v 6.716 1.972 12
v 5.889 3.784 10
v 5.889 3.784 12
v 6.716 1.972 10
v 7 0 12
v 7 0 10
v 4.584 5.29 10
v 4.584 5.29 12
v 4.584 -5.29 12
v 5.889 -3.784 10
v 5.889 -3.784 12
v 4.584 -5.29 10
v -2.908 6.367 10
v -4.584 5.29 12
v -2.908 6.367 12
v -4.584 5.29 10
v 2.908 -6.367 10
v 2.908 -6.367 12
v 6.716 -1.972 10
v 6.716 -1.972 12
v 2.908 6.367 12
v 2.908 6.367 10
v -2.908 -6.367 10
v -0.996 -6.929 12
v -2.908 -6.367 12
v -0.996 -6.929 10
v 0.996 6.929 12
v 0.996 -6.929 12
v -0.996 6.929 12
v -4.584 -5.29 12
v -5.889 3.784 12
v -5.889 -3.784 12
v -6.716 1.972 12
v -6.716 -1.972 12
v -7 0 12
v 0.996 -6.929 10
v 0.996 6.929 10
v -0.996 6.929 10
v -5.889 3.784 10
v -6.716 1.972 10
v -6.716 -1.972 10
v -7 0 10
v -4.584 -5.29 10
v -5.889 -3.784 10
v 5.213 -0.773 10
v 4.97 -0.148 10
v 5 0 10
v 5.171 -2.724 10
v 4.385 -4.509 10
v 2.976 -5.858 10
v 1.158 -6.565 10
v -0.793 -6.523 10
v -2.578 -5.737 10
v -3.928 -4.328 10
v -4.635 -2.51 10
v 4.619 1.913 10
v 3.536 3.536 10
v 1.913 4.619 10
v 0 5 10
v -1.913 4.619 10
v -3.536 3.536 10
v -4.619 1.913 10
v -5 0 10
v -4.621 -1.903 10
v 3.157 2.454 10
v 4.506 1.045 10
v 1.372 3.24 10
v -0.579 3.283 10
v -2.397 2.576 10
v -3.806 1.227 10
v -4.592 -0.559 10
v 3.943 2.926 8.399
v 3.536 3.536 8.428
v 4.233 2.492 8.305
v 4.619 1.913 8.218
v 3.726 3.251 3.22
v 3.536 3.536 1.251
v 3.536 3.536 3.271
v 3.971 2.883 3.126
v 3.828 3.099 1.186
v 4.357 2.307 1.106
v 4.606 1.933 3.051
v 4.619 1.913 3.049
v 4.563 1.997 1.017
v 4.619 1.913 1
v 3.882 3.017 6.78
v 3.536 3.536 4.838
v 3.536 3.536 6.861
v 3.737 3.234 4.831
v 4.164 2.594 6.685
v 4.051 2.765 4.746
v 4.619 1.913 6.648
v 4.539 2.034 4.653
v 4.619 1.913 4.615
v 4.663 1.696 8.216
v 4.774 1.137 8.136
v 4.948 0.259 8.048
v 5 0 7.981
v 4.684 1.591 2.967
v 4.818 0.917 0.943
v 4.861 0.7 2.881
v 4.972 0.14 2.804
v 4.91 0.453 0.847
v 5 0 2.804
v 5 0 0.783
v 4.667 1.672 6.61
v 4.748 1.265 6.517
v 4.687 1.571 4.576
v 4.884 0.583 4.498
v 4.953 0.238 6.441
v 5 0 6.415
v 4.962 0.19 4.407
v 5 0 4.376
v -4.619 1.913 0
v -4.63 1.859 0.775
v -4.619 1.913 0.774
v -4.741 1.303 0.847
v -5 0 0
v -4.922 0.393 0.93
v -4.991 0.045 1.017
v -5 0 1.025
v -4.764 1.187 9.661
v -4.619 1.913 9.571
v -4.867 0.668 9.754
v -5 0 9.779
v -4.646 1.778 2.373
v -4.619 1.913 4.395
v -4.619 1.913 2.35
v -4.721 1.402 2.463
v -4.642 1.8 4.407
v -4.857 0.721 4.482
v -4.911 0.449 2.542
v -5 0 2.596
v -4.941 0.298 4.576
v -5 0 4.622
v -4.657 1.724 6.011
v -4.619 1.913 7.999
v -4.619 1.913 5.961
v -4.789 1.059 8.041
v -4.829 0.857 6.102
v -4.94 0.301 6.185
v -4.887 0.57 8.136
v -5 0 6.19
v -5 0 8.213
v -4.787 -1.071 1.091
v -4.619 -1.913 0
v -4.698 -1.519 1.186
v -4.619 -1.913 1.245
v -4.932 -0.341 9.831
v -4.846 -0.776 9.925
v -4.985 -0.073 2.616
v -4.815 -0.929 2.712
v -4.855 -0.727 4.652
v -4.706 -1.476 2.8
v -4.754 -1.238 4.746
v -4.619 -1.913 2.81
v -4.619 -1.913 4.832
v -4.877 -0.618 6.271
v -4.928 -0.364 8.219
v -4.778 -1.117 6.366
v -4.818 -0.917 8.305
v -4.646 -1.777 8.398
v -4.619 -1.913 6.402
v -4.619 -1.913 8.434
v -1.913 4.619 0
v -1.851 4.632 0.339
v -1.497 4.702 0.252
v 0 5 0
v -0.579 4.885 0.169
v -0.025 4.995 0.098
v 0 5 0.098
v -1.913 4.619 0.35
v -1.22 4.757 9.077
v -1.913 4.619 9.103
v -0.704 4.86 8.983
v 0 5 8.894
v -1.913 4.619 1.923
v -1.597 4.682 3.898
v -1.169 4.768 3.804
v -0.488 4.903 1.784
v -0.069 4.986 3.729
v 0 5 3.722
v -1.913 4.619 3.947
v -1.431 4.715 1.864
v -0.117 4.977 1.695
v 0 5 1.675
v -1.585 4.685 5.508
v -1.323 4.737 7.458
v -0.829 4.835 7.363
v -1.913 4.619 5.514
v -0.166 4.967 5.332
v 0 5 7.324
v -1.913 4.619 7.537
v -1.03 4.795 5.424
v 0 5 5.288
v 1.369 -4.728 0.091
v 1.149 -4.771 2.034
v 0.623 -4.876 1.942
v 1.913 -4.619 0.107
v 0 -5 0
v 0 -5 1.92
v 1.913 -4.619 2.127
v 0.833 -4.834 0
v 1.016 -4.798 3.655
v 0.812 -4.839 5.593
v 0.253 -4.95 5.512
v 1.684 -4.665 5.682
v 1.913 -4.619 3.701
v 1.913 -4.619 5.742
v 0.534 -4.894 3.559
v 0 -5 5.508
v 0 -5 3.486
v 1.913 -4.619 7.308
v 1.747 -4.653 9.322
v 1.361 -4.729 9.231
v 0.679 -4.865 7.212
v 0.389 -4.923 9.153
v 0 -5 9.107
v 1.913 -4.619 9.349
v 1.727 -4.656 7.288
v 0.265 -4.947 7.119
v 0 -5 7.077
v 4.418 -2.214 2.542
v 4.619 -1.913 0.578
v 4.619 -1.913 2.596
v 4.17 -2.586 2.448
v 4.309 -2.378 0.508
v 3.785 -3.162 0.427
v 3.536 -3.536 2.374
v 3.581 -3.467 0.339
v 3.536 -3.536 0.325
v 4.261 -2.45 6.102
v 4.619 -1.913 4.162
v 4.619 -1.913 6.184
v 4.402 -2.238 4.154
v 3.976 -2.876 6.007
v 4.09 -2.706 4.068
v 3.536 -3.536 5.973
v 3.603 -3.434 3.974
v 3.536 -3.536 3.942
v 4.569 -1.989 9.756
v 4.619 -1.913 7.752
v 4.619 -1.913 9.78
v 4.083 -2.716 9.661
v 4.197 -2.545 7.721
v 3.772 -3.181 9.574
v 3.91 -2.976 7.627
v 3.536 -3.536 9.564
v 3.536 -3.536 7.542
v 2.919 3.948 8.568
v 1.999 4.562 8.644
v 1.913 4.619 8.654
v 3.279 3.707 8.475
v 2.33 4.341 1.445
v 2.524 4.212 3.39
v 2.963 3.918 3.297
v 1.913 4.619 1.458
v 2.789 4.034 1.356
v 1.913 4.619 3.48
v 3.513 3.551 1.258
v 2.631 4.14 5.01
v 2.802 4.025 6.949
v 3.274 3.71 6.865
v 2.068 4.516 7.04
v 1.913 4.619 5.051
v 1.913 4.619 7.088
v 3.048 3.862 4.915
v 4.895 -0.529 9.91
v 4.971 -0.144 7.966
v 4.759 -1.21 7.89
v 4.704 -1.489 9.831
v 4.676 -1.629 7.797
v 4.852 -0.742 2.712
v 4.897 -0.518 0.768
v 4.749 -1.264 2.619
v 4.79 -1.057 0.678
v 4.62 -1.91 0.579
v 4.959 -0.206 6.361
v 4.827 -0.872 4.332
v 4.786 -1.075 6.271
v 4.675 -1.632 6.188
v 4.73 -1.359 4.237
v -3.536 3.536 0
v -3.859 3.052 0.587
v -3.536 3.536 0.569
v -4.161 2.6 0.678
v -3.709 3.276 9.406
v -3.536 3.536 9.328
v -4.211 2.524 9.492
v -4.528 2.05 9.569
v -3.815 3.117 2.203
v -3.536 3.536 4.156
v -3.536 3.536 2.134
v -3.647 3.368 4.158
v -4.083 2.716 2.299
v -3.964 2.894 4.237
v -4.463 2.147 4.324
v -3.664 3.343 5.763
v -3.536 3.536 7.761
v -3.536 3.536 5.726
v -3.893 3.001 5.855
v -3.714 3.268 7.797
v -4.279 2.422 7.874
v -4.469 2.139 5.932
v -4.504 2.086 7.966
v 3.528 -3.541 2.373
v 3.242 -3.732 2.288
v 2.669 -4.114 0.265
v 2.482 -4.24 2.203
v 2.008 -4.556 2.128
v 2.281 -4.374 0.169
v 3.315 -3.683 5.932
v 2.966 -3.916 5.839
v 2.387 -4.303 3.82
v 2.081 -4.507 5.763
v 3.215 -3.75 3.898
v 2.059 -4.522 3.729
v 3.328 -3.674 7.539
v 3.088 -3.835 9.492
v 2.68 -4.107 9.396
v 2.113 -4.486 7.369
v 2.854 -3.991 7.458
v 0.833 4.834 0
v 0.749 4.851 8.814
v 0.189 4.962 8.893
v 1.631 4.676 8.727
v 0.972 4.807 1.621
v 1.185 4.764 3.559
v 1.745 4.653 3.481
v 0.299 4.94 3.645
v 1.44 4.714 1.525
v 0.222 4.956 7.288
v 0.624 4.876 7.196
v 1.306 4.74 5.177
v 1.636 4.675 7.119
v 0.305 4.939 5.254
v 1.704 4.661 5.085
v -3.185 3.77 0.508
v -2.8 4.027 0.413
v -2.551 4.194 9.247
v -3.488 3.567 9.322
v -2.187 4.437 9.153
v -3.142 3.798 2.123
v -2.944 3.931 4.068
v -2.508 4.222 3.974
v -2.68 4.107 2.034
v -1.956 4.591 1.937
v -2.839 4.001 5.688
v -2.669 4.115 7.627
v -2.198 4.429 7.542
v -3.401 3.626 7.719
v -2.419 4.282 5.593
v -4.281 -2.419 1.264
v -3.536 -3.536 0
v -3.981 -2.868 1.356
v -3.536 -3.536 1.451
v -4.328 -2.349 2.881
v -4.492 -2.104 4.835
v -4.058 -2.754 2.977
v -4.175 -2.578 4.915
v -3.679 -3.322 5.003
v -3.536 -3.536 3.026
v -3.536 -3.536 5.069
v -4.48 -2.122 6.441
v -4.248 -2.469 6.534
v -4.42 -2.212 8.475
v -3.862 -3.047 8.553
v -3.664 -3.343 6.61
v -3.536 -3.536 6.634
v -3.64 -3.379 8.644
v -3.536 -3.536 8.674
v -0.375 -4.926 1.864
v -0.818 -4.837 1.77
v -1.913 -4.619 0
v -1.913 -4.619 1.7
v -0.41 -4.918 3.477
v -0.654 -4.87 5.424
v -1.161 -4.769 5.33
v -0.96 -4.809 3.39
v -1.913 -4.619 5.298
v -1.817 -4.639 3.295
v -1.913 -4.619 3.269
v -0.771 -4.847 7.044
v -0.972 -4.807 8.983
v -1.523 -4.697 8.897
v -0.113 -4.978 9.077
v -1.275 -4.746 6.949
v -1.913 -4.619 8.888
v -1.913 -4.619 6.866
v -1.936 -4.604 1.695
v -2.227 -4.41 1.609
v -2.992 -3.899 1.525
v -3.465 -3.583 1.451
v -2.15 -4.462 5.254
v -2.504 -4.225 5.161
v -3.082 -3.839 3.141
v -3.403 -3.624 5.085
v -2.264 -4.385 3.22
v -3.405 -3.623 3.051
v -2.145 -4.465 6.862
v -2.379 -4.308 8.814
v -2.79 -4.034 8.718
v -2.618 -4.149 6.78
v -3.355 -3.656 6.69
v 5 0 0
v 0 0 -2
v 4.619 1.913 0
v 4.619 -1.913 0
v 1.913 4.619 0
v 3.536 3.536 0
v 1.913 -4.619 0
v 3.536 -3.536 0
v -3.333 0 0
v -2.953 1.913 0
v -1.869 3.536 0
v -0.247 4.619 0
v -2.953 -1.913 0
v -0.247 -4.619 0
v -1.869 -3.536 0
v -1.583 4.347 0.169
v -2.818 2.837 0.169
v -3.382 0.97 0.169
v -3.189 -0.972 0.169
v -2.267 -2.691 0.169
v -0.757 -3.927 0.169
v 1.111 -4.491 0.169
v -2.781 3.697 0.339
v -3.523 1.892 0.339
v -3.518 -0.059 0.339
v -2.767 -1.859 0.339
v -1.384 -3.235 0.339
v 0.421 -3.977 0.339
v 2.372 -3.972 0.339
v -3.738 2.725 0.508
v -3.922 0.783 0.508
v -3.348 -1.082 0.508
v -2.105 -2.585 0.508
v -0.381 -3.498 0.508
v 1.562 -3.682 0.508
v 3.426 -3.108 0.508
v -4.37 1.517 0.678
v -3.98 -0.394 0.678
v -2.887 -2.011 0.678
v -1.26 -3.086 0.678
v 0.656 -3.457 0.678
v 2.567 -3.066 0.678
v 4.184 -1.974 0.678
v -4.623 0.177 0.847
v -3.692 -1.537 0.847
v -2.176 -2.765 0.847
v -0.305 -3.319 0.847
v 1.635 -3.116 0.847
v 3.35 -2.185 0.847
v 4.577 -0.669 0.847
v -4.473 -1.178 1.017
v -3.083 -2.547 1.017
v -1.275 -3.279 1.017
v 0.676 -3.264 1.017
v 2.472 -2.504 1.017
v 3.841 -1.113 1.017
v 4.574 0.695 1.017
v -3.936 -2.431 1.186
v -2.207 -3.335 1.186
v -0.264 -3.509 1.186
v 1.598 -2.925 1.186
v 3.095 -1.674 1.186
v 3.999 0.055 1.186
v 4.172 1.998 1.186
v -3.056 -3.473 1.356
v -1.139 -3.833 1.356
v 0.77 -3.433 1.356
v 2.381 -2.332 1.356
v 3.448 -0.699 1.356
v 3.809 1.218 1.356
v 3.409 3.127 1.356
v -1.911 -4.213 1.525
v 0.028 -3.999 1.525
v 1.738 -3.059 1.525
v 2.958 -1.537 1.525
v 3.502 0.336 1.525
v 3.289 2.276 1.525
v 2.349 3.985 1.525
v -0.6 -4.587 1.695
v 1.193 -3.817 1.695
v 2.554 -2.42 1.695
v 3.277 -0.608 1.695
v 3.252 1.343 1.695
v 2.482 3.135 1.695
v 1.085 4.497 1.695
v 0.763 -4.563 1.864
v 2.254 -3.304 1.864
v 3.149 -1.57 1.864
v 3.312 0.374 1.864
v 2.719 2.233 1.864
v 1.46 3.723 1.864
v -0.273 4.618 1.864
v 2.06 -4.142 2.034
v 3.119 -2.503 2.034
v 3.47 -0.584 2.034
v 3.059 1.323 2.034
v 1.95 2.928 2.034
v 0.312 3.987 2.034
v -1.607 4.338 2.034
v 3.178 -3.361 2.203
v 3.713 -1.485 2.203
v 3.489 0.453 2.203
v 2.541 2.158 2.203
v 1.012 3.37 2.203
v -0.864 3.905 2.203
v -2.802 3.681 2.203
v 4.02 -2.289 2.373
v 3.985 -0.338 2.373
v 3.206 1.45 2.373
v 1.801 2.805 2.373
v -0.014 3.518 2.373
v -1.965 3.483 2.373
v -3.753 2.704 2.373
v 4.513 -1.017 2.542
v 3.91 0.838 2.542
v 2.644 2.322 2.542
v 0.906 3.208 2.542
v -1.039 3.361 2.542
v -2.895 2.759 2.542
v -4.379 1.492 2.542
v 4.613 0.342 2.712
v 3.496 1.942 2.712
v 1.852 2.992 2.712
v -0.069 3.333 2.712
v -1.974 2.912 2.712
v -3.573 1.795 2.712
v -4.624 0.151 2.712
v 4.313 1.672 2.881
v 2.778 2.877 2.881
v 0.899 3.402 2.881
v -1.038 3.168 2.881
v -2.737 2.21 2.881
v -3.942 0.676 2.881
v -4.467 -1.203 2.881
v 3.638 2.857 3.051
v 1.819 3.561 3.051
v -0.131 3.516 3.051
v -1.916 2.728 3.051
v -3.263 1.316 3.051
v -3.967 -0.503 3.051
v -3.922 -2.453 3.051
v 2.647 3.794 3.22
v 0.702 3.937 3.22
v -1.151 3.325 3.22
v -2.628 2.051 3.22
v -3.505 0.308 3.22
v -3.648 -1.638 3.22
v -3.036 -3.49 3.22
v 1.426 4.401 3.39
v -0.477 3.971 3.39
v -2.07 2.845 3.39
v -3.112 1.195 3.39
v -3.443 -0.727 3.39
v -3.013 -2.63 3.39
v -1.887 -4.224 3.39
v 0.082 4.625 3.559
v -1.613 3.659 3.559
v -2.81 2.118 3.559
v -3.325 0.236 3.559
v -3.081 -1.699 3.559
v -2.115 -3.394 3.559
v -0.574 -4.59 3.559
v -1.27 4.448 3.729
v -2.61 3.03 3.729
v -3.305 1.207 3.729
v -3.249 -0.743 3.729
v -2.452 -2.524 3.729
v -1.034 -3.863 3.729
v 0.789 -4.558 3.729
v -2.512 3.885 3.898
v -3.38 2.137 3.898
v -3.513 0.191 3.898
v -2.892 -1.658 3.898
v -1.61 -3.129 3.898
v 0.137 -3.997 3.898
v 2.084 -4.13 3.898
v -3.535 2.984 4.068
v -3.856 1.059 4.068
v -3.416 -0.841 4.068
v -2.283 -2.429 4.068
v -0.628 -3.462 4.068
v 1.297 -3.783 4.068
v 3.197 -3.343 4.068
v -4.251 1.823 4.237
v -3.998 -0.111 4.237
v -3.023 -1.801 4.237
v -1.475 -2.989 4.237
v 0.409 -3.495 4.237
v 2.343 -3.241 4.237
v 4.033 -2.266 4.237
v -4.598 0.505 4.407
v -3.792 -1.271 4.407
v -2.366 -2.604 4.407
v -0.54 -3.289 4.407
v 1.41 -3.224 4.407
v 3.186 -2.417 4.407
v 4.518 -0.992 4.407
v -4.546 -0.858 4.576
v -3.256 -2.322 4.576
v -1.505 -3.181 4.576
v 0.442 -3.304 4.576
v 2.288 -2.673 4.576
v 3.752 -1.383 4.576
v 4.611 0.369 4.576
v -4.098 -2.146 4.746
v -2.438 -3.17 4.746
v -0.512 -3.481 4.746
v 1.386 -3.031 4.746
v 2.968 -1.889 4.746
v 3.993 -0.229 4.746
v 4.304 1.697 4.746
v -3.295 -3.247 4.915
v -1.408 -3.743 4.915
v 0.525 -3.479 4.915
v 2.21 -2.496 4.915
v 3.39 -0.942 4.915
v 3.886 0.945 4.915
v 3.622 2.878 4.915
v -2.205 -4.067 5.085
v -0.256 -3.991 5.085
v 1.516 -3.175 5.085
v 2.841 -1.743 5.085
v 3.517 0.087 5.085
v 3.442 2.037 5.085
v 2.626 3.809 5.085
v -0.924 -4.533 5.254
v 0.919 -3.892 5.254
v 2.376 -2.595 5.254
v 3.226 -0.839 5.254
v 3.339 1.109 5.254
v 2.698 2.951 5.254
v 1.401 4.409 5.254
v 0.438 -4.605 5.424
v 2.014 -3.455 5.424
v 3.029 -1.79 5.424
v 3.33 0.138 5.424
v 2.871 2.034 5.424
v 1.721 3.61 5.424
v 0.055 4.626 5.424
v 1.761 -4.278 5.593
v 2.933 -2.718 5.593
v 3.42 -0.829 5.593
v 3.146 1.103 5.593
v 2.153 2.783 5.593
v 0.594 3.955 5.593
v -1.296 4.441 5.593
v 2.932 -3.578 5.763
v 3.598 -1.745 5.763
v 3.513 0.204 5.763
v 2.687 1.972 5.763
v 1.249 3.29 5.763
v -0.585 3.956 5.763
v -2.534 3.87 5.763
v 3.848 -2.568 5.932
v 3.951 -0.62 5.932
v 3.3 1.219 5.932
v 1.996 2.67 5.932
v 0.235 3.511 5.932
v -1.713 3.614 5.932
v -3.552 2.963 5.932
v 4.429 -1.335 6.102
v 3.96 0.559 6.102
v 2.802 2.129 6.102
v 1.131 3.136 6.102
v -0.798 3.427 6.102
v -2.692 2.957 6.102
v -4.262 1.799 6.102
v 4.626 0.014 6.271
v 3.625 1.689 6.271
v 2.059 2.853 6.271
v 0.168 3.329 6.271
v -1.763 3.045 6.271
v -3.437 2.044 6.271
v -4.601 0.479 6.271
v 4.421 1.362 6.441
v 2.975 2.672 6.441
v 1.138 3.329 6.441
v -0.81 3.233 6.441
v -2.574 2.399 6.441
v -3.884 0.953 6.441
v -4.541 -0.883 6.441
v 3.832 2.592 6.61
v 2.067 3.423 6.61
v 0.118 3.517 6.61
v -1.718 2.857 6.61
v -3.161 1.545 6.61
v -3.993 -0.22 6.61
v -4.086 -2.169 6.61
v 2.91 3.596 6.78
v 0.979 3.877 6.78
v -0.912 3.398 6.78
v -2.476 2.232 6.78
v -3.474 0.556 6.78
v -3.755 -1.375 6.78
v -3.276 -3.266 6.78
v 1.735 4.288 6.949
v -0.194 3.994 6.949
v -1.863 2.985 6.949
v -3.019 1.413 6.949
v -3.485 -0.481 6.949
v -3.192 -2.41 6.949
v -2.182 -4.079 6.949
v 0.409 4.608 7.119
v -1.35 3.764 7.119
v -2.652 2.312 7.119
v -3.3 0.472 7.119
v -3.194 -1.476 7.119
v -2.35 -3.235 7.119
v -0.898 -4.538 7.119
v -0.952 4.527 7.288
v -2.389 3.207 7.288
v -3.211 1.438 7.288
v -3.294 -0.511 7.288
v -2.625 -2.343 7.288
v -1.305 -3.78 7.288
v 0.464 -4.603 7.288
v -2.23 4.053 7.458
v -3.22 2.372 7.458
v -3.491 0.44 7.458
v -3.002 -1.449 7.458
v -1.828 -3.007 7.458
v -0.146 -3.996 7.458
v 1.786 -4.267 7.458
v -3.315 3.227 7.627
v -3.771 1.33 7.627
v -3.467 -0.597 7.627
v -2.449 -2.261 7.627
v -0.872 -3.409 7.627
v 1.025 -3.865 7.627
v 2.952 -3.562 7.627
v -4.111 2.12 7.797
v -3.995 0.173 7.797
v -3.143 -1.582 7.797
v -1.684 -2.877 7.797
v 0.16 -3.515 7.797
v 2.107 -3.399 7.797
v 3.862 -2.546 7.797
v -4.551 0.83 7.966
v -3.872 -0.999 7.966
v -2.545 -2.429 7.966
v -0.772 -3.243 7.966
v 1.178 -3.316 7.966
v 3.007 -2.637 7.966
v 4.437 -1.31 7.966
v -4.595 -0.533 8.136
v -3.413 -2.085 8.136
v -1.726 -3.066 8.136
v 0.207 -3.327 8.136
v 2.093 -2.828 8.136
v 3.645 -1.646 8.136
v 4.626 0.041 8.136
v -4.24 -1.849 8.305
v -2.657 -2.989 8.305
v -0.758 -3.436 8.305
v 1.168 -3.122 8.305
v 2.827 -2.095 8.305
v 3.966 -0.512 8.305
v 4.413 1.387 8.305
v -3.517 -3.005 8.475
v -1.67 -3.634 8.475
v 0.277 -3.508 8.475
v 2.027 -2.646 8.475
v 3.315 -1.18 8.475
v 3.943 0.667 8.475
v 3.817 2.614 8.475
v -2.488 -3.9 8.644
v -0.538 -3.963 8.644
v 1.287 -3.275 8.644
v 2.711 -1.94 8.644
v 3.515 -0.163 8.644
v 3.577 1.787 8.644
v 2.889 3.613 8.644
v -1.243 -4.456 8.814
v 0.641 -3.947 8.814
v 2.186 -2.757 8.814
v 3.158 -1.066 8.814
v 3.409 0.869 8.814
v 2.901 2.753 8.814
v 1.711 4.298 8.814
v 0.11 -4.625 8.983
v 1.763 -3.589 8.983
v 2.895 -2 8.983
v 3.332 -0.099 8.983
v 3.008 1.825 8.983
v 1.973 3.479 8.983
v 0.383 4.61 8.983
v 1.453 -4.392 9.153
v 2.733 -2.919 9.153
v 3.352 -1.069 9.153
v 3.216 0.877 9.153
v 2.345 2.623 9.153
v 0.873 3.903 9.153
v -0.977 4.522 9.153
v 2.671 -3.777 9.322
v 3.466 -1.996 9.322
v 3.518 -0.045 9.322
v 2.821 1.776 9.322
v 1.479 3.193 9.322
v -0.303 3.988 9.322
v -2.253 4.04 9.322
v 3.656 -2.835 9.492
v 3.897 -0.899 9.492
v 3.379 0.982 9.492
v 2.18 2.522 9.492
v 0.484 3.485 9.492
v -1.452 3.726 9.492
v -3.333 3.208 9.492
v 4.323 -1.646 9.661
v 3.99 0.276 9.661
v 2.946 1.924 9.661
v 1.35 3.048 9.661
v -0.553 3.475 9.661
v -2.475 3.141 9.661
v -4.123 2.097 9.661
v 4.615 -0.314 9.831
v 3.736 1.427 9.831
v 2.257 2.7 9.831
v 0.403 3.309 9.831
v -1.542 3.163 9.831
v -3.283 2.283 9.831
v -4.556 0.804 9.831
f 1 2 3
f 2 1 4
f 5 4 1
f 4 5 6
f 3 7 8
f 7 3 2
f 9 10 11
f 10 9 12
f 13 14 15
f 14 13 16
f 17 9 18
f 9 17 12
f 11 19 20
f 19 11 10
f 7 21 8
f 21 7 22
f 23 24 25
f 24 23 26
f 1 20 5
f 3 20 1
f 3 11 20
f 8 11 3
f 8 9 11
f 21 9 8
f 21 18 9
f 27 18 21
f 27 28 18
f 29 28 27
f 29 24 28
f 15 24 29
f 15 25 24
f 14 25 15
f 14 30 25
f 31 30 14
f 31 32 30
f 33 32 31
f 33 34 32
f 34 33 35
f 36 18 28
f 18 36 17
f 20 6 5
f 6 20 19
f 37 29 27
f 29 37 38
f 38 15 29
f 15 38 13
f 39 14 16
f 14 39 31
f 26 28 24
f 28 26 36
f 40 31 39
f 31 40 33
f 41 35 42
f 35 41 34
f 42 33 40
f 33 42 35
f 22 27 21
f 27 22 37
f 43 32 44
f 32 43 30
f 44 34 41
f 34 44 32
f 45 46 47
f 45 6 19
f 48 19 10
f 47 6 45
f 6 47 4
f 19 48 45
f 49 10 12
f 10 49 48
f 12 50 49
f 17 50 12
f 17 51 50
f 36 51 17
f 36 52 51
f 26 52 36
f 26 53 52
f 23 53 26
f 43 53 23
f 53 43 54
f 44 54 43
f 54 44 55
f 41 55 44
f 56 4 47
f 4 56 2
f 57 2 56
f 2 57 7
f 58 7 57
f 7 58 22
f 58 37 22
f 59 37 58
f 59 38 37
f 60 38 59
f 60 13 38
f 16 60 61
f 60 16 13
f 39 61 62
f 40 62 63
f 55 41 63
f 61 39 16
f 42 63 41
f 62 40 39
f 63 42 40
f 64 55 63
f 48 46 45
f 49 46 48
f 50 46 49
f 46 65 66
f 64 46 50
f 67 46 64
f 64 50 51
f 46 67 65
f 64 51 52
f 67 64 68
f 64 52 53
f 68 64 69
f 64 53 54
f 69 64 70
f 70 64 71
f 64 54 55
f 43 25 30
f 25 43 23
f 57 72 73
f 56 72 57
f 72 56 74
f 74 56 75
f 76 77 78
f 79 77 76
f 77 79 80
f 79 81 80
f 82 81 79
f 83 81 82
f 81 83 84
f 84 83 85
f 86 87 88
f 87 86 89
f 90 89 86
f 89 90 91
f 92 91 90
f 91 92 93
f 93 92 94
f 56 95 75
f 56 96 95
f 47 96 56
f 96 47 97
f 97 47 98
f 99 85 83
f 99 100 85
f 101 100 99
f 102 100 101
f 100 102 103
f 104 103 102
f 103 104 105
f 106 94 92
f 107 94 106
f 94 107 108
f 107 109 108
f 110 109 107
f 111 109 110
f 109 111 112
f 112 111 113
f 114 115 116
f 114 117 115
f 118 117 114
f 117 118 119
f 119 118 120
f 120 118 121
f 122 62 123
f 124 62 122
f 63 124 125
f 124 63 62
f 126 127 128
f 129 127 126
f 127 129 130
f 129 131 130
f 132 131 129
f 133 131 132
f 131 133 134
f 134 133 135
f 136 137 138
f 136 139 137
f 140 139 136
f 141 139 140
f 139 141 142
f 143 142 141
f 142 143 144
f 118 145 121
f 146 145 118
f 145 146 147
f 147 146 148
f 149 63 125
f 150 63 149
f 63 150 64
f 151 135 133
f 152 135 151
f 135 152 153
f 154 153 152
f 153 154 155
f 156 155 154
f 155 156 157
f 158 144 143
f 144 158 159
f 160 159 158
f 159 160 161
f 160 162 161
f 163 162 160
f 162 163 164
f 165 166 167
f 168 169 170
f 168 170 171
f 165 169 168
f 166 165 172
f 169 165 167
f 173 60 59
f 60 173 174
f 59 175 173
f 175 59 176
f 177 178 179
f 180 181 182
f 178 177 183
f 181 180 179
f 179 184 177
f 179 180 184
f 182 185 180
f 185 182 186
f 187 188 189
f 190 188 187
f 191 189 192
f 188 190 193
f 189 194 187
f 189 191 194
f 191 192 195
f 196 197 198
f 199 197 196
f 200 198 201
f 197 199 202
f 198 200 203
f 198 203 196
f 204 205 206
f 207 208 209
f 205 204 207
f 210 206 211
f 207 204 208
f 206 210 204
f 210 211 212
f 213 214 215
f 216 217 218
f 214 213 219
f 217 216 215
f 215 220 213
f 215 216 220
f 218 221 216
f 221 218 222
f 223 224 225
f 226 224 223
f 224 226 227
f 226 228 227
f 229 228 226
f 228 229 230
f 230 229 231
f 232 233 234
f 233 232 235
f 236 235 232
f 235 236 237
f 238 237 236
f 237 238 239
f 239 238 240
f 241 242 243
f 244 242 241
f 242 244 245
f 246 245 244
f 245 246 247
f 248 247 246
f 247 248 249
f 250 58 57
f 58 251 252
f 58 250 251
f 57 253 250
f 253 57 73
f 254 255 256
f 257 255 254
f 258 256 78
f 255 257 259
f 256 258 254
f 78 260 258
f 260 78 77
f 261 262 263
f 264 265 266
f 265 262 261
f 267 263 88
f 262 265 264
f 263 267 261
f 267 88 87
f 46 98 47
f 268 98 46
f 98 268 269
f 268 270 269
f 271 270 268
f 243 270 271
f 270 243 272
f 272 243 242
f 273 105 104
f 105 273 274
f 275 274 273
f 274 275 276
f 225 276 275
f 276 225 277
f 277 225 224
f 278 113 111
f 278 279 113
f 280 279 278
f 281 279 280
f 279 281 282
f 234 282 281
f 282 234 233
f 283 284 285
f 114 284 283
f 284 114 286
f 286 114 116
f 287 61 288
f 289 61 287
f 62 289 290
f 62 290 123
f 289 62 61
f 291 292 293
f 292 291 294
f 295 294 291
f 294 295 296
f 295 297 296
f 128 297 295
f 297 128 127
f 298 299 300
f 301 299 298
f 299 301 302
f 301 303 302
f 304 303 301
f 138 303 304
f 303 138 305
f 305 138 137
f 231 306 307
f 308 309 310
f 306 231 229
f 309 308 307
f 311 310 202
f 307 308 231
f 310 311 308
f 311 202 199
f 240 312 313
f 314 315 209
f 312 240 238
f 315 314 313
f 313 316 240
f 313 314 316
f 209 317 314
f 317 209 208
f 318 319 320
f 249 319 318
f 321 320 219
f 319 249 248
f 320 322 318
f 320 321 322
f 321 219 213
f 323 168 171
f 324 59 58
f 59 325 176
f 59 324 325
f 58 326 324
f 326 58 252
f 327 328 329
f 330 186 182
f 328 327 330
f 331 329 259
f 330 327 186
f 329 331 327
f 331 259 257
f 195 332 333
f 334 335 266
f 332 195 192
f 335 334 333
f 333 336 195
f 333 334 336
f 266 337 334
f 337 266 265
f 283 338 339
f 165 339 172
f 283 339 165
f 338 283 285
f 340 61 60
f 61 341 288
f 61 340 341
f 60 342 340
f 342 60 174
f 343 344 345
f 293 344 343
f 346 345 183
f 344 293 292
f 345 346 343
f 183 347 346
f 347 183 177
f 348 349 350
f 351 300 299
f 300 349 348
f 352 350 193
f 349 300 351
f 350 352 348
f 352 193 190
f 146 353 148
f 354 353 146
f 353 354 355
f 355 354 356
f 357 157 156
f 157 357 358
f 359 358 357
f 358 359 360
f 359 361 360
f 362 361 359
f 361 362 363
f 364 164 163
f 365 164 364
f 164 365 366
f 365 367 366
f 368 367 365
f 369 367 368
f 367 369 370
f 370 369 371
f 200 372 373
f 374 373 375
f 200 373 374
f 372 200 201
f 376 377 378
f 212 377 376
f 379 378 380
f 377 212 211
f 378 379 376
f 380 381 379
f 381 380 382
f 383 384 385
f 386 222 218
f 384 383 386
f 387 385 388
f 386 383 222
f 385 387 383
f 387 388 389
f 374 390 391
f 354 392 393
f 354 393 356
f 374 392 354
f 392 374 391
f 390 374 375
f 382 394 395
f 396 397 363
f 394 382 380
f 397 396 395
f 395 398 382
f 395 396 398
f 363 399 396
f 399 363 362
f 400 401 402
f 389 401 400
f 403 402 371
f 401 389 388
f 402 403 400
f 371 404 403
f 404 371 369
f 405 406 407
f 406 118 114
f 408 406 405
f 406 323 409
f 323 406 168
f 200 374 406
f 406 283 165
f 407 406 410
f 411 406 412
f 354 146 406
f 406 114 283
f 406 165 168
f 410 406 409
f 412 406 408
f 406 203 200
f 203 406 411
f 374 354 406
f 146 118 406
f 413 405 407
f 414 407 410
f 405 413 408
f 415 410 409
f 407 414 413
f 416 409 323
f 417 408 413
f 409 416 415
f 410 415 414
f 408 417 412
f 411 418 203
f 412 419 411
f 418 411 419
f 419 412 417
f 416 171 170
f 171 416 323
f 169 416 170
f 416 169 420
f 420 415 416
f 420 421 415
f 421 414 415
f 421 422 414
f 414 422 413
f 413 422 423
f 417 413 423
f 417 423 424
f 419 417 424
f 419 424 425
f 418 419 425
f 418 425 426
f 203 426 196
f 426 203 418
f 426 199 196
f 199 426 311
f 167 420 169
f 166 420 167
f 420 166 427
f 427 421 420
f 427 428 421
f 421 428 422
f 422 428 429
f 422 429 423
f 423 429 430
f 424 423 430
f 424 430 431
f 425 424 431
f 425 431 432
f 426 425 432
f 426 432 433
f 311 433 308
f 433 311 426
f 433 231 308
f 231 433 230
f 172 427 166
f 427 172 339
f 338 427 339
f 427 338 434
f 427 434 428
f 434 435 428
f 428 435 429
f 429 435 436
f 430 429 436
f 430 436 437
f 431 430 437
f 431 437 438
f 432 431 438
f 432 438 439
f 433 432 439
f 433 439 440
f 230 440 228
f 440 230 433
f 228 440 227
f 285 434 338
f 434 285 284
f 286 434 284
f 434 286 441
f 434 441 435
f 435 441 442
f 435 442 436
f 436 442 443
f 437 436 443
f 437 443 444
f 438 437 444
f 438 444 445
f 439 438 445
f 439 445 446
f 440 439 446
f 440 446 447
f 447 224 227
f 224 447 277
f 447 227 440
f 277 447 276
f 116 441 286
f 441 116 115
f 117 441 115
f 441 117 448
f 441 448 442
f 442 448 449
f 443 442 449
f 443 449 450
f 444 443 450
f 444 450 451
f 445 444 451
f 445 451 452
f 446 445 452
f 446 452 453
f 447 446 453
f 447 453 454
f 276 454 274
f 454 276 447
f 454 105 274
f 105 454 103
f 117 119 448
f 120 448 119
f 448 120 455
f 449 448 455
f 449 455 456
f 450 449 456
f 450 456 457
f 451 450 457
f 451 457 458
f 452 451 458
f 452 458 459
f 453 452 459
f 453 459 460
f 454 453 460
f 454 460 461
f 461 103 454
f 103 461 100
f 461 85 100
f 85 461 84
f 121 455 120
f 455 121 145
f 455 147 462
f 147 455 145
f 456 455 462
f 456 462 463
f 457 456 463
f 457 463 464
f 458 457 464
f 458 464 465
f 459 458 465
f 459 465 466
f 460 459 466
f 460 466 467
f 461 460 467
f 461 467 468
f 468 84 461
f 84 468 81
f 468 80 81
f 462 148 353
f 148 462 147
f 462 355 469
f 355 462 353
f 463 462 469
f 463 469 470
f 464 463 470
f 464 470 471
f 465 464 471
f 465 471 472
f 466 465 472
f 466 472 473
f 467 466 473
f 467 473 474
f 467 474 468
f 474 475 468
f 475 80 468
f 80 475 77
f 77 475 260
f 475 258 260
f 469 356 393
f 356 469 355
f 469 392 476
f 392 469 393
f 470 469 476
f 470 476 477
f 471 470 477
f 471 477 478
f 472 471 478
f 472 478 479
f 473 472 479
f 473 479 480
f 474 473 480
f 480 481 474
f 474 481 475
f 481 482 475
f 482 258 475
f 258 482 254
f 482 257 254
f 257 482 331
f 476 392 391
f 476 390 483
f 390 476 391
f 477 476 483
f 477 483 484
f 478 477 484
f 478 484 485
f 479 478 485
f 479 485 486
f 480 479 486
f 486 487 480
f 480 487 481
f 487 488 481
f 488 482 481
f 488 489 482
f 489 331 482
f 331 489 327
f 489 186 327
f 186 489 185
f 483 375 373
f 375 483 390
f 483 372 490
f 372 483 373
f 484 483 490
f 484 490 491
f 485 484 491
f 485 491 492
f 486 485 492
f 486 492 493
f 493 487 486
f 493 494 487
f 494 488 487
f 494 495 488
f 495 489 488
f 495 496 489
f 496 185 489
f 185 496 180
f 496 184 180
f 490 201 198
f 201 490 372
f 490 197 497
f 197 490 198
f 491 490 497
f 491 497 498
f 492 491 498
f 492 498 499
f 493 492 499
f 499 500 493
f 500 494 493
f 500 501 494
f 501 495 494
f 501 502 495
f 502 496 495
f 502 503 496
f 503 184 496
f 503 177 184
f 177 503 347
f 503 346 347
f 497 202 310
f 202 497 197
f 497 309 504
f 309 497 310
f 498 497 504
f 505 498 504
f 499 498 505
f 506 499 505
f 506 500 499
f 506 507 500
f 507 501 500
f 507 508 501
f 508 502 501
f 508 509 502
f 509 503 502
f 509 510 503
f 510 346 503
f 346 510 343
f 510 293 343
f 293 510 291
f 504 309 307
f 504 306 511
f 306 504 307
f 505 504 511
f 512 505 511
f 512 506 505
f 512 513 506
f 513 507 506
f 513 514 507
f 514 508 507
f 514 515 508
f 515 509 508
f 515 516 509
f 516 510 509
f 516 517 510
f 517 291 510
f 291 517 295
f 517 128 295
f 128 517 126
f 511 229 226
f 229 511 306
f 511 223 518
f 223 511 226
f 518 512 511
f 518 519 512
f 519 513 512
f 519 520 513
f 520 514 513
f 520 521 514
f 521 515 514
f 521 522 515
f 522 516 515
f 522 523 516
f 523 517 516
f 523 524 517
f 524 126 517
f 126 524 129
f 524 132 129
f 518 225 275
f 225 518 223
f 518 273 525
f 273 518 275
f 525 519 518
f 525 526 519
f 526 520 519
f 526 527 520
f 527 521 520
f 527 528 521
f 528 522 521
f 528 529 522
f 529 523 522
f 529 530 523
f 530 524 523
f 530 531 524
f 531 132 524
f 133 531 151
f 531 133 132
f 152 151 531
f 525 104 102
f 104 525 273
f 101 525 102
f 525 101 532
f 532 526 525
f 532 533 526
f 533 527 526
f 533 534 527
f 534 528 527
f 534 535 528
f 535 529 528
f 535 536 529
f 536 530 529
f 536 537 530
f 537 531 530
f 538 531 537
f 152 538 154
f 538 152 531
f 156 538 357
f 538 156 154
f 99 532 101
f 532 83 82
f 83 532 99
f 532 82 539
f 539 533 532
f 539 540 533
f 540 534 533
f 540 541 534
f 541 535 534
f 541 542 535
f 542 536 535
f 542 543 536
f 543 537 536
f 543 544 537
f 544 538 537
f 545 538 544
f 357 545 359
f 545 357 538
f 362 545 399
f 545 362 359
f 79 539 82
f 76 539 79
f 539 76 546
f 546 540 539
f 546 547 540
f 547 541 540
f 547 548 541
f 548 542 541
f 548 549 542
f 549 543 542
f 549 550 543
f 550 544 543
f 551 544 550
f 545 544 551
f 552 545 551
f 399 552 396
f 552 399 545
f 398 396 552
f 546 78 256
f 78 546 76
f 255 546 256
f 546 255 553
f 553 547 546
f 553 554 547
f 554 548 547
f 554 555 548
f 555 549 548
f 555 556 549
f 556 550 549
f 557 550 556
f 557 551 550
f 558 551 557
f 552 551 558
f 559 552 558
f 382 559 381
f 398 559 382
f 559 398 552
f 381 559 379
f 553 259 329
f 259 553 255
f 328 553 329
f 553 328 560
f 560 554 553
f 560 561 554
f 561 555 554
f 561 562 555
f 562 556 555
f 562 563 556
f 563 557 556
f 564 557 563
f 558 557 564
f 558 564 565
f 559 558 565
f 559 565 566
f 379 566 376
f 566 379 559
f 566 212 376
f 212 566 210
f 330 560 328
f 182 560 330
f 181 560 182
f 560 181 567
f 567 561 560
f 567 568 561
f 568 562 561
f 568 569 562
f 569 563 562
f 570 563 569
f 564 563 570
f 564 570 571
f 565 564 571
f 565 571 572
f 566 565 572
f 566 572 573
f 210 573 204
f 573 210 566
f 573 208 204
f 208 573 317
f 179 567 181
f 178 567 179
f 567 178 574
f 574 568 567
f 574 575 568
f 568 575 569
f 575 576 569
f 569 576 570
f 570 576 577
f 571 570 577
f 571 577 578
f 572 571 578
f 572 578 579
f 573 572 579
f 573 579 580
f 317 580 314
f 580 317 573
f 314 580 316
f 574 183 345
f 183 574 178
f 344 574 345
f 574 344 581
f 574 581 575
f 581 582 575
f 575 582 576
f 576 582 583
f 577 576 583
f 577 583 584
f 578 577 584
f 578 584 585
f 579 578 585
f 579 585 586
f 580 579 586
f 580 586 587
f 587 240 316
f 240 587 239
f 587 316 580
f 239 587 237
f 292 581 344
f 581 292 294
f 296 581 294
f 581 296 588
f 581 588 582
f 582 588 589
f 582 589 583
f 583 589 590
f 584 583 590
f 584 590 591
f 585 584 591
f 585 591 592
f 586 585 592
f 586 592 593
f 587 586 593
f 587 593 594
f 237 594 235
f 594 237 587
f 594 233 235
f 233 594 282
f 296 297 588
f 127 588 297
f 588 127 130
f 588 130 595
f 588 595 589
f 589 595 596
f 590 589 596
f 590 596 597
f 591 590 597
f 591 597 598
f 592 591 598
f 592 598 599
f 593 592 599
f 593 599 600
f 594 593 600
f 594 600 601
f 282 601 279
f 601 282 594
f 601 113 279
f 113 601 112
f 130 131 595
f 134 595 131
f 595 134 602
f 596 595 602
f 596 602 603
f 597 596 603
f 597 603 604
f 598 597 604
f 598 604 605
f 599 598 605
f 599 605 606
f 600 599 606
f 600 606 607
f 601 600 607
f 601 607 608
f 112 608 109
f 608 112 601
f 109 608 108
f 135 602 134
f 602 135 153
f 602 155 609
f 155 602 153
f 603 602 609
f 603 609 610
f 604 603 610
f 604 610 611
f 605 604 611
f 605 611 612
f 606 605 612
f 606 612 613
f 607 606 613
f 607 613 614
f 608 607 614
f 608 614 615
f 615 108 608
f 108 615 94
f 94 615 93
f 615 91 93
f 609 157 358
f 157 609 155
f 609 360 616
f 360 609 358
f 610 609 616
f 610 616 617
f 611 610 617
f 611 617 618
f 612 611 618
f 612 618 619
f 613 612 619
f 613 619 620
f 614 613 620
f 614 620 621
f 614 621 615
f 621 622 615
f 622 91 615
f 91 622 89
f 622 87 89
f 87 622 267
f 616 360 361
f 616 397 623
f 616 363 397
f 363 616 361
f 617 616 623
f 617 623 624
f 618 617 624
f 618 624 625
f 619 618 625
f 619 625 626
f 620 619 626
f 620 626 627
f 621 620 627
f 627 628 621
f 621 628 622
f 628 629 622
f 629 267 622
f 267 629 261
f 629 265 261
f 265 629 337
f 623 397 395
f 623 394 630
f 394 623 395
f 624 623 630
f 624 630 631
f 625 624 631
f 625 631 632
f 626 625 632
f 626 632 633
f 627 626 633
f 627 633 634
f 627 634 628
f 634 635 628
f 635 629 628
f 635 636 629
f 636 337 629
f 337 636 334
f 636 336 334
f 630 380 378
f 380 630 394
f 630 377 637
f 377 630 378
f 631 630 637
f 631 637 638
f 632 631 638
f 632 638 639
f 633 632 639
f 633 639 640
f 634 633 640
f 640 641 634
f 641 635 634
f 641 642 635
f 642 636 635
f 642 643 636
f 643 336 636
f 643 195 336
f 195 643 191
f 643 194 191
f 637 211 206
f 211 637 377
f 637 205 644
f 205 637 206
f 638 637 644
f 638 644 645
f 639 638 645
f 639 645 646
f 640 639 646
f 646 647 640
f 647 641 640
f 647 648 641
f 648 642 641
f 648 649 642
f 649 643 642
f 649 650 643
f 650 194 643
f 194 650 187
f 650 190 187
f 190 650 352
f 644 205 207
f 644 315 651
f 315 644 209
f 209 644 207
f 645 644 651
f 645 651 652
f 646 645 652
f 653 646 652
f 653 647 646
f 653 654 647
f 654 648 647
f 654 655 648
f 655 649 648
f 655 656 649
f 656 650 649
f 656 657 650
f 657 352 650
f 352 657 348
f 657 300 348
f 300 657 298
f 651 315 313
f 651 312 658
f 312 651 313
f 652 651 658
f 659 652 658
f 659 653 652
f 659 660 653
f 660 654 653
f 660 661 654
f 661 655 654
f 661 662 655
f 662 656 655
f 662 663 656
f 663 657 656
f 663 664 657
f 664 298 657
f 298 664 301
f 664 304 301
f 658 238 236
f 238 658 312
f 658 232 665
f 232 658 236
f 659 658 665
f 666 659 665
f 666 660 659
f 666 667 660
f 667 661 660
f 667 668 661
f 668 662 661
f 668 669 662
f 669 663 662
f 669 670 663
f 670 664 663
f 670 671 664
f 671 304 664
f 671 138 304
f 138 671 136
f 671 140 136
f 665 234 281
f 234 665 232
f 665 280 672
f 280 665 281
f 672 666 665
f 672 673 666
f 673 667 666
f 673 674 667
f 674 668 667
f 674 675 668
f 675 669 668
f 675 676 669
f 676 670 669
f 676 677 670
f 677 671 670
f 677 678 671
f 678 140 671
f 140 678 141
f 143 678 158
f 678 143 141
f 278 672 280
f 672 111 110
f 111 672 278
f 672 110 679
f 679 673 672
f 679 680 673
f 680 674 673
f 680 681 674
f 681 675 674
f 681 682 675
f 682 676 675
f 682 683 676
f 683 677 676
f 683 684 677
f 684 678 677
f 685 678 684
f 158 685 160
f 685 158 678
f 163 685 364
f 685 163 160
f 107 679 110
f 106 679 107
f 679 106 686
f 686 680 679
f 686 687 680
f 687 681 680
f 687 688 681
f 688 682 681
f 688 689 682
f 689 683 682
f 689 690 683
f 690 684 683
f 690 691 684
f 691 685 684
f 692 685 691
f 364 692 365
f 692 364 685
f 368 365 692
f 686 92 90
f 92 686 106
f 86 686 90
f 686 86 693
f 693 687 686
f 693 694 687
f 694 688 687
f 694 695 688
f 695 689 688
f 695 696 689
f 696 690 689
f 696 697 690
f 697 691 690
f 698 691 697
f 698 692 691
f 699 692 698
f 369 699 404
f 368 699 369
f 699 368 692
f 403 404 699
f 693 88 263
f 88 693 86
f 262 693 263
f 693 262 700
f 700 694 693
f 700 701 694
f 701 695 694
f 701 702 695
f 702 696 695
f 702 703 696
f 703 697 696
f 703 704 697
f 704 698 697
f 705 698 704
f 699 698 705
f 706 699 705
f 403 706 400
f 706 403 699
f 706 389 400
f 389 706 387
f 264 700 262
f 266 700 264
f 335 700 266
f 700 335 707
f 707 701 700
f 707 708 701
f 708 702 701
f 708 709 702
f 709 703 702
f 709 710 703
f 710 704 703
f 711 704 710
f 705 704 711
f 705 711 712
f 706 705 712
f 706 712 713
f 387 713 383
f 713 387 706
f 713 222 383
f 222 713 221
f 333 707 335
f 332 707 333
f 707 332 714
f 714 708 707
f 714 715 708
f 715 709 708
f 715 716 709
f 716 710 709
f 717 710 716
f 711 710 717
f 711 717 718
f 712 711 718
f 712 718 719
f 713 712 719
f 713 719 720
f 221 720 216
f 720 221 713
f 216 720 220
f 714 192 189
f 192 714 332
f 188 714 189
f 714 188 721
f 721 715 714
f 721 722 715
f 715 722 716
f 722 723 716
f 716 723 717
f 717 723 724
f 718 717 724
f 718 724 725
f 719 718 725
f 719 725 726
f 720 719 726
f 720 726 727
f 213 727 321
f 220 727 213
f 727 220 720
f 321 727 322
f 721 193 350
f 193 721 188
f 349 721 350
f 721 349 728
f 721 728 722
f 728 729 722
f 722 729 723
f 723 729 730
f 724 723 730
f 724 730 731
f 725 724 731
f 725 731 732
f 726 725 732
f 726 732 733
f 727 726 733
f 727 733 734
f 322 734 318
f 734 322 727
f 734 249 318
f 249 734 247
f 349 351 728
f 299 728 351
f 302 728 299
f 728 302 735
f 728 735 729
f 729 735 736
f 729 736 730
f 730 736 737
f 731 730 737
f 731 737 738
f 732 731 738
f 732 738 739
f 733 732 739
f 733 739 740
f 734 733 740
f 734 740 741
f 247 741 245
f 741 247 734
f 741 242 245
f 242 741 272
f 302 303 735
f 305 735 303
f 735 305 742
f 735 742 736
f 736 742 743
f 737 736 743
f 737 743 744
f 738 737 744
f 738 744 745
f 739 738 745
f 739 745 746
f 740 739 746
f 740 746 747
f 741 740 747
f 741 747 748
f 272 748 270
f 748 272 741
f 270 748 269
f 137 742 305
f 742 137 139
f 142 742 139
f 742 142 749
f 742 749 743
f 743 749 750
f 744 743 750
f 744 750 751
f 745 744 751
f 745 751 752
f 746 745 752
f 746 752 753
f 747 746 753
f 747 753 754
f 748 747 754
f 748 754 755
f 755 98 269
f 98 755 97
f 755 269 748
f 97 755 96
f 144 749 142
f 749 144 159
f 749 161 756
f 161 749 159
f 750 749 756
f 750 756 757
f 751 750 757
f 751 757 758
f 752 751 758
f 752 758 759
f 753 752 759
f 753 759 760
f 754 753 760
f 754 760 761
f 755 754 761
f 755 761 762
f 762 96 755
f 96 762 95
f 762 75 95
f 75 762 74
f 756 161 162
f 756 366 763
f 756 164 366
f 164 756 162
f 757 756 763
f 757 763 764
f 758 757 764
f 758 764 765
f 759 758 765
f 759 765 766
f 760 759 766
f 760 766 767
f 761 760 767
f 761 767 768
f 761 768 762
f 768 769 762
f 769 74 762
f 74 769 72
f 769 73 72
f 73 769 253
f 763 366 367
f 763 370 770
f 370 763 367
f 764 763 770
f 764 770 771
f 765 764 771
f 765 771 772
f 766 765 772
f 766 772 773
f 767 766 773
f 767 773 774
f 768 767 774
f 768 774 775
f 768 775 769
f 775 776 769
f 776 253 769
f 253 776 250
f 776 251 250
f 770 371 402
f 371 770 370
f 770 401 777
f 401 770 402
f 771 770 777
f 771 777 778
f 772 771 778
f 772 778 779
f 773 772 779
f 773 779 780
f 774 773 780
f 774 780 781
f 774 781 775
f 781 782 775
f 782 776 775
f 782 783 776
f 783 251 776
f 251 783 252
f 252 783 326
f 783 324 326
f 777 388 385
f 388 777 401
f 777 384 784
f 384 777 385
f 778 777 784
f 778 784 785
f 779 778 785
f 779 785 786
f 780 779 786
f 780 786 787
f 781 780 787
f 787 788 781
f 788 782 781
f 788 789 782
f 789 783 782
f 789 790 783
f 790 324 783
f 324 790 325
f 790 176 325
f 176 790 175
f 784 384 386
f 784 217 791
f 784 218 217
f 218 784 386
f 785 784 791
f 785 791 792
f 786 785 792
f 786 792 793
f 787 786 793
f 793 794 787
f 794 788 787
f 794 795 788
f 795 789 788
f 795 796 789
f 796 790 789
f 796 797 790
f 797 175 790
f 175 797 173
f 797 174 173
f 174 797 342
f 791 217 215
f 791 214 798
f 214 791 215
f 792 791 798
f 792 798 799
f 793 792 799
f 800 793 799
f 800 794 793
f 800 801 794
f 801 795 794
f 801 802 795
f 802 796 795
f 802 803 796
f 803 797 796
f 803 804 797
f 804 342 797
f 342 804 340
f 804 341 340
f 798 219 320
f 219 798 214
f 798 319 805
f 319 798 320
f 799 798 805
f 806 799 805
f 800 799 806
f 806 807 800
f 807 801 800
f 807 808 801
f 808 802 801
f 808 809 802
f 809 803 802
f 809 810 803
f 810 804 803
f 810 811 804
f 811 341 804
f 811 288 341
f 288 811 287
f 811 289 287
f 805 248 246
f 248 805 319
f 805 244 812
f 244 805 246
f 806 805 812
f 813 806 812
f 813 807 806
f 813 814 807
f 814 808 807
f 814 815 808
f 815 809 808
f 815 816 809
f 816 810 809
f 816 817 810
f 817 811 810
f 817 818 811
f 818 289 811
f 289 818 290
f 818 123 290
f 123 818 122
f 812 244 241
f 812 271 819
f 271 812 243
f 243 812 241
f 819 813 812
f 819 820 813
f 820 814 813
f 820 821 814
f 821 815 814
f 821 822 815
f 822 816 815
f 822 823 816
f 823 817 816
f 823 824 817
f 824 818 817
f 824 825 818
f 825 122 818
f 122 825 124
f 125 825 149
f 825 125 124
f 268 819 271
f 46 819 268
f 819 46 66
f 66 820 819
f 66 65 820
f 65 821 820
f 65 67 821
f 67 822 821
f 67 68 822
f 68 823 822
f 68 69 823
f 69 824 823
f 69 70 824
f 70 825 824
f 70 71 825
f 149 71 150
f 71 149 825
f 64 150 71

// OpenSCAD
// test comment vanuit openscad

vijs_hoogte = 10;
vijs_dikte = 5;
punt_hoogte = 2;
kop_hoogte = 2; // test 2
kop_dikte = 7;
draad_dikte = 2;

module vijs_schacht(vijs_hoogte,vijs_dikte) {

	cylinder(vijs_hoogte,vijs_dikte,vijs_dikte);
	

}

module vijs_punt(punt_hoogte,vijs_dikte) {
	
	translate([0,0,-punt_hoogte]) cylinder(punt_hoogte,0,vijs_dikte);


}

module vijs_kop(kop_hoogte,kop_dikte) {
	translate([0,0,vijs_hoogte]) 
	cylinder(kop_hoogte,kop_dikte,kop_dikte);
	
}

module vijs_basis() {
vijs_kop(kop_hoogte,kop_dikte);
vijs_schacht(vijs_hoogte,vijs_dikte);
vijs_punt(punt_hoogte,vijs_dikte);
}

module vijs_draad() {
	
	linear_extrude(height = vijs_hoogte, center = false, convexity = 10, twist = -1000) translate([10/6,0,0]) circle(5);

}

difference() {
vijs_basis();
vijs_draad() ;
}
